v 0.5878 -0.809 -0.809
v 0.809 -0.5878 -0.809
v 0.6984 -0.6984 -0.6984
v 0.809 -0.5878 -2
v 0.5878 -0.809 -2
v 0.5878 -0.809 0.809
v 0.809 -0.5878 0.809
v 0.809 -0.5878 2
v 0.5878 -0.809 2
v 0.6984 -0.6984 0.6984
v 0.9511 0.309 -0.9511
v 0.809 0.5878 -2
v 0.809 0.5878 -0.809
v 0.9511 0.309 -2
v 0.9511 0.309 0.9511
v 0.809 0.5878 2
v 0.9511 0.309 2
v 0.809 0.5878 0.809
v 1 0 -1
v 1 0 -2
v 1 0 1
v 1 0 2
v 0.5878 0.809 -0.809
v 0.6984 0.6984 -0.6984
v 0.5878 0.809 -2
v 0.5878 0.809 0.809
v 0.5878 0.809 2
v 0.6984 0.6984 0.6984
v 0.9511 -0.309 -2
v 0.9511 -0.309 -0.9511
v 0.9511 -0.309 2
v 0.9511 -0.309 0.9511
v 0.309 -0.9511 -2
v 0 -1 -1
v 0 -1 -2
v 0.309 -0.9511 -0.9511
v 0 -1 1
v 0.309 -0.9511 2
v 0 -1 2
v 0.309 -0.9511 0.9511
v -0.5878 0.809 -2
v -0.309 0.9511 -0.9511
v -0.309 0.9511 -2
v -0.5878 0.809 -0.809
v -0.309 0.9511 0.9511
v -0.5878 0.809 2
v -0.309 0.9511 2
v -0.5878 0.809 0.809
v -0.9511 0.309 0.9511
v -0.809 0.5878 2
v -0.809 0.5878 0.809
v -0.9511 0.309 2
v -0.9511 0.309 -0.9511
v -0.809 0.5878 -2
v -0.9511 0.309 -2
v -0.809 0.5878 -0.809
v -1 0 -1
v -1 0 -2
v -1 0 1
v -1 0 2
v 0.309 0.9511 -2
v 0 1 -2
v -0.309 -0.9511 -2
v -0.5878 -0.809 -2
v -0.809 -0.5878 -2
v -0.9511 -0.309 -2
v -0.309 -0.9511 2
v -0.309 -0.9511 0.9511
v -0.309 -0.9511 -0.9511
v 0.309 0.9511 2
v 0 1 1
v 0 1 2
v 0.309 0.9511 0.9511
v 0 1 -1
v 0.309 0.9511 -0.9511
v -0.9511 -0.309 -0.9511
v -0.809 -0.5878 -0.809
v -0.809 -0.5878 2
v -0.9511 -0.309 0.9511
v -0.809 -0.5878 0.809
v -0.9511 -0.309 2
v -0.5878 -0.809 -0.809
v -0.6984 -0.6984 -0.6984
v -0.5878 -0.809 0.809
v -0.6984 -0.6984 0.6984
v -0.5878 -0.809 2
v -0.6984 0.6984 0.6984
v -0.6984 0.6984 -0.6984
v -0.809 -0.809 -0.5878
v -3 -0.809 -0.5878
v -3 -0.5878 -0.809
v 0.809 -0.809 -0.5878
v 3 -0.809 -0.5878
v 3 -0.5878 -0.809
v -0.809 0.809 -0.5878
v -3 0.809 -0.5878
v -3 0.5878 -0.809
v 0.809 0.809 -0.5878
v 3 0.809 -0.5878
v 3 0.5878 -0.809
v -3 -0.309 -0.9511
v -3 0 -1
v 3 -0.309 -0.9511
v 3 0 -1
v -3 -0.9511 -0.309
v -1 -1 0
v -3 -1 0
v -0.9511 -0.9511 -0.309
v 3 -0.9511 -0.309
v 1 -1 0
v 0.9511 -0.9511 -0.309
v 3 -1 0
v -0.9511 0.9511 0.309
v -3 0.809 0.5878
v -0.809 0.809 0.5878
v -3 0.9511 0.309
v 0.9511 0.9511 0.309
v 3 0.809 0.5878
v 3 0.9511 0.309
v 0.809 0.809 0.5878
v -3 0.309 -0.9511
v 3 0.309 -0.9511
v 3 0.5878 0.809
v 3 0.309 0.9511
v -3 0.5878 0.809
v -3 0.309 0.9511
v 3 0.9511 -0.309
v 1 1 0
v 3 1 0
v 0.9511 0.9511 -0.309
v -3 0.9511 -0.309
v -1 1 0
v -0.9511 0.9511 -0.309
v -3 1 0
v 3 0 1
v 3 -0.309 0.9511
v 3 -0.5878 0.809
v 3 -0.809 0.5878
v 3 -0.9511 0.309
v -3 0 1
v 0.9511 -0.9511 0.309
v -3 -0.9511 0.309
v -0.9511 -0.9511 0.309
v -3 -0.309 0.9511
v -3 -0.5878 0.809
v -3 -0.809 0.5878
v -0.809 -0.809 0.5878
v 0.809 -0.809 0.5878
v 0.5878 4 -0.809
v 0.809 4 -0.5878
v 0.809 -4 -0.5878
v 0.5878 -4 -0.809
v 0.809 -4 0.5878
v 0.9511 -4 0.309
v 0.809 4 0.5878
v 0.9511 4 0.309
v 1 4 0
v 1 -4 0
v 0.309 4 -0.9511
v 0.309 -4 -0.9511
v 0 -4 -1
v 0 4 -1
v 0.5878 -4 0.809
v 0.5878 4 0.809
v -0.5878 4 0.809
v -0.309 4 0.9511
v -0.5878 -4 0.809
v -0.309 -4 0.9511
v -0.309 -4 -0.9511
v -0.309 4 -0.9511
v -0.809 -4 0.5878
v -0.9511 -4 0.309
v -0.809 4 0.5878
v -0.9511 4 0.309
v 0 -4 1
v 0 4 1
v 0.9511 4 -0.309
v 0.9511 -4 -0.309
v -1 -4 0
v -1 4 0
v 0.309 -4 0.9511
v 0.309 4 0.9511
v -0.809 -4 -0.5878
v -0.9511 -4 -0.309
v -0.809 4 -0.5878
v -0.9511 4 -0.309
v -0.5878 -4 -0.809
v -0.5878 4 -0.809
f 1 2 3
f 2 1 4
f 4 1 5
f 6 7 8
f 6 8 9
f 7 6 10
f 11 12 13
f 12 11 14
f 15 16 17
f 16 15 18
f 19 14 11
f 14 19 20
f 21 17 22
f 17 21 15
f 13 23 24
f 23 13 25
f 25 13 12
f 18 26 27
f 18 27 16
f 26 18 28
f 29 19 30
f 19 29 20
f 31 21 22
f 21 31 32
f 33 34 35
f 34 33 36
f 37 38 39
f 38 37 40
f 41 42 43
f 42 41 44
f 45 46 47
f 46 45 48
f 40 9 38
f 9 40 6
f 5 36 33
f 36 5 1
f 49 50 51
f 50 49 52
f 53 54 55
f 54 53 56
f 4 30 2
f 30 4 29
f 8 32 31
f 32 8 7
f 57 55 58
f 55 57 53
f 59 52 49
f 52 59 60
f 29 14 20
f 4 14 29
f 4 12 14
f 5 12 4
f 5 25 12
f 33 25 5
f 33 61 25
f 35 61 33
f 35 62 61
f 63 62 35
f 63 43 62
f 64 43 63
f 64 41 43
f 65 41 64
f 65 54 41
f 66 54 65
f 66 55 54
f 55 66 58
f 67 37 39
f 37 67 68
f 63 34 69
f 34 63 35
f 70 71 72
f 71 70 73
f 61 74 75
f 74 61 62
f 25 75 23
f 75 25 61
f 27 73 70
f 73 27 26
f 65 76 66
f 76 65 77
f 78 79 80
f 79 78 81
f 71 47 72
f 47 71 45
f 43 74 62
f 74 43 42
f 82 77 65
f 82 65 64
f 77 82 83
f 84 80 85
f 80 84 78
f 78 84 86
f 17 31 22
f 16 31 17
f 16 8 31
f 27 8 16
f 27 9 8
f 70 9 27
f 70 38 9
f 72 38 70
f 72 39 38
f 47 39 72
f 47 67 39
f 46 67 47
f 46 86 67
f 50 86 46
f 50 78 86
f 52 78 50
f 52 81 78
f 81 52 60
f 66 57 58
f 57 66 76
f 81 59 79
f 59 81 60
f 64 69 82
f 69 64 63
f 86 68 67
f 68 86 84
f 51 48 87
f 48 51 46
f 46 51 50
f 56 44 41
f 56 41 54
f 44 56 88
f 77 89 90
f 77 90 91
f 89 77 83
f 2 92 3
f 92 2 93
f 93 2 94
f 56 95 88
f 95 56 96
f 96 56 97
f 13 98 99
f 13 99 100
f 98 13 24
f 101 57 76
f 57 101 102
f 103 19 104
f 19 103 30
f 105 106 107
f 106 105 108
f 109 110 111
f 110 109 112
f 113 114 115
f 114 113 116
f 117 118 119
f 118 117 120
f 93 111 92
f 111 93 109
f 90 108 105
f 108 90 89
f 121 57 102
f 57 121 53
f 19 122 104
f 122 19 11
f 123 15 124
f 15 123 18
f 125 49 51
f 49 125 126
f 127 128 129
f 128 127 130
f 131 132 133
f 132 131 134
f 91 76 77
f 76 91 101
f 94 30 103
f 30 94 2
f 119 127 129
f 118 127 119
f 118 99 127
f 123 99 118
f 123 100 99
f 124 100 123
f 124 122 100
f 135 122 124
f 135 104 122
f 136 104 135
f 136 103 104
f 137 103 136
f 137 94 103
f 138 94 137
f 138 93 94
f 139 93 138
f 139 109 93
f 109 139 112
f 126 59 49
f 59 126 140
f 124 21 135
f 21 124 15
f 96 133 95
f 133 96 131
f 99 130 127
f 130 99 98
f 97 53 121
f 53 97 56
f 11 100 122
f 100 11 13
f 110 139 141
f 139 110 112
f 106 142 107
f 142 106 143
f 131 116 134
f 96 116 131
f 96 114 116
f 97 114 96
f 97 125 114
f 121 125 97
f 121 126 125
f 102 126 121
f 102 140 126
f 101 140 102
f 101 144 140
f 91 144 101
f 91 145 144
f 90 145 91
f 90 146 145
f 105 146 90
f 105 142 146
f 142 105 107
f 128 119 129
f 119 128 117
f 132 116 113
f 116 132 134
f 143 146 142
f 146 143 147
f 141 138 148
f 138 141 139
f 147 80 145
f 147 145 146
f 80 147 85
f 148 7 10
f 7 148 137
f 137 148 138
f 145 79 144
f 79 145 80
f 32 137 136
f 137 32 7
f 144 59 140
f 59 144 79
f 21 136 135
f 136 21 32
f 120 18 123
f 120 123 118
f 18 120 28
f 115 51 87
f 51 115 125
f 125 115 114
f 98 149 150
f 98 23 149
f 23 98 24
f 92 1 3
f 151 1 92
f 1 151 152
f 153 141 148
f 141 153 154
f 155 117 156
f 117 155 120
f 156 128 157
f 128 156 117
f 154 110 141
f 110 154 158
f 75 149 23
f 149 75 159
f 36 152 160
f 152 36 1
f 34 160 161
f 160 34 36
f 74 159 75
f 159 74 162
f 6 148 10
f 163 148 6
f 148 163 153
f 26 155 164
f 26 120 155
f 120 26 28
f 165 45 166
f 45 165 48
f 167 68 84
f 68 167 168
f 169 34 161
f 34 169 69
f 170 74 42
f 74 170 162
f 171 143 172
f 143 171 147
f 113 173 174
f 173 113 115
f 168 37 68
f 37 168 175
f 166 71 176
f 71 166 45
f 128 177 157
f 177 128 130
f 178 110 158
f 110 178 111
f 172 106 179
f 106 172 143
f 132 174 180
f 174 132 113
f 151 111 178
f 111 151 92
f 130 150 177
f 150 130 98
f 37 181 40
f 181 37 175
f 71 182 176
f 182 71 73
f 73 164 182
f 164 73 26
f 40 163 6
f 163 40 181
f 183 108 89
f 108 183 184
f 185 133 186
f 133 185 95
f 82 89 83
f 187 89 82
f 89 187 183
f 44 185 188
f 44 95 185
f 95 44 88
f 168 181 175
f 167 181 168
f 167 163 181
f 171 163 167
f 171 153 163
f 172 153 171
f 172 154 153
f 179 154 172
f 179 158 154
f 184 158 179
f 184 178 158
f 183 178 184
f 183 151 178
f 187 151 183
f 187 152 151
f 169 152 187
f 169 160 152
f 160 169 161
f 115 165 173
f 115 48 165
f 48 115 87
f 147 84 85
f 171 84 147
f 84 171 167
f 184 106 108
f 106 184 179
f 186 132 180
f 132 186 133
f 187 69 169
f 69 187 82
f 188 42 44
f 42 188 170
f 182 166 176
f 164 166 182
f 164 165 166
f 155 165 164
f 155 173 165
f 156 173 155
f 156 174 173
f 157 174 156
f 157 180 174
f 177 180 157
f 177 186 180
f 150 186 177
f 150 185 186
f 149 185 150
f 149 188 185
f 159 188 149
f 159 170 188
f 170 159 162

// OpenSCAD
$fn=20;

module bar(h) { cylinder(h=h,r=1,center=true); }

module work() {
   bar(4);
   rotate([0,90,0]) { bar(6); }
   rotate([90,0,0]) bar(8);
}

work();
